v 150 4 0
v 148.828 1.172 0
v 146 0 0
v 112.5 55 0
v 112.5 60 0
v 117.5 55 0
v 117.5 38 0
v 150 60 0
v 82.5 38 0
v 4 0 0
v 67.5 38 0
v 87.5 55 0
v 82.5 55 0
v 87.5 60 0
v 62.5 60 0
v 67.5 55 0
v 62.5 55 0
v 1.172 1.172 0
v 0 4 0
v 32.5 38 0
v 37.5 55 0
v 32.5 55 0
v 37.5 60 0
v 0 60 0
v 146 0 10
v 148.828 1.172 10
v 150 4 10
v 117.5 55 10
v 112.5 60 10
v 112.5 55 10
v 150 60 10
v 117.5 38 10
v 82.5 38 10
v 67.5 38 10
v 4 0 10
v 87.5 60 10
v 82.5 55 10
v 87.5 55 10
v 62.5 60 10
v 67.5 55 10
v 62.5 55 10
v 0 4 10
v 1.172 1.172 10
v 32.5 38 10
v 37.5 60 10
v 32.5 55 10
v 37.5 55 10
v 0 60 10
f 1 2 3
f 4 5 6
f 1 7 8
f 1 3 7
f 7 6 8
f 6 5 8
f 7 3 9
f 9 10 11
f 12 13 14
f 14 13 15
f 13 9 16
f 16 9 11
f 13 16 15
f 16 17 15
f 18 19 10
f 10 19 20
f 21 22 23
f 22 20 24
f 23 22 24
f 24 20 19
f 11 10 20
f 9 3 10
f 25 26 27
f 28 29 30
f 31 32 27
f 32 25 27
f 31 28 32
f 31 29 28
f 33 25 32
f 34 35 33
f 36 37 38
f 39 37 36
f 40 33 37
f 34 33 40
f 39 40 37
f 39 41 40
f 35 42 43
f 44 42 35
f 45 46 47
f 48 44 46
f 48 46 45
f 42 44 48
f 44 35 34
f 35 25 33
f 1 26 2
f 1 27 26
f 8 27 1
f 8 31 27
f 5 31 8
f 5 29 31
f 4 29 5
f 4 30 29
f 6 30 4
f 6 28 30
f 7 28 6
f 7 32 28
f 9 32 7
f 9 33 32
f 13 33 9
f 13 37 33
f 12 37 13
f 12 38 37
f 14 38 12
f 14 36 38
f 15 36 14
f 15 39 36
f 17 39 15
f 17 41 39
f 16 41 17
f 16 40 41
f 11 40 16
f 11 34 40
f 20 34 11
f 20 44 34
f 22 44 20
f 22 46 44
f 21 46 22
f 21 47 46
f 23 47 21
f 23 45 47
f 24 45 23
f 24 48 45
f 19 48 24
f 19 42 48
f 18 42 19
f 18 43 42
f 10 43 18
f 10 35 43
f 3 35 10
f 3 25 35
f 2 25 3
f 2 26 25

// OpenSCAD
$fn = 32;

// ----------------------------------------------------------------------
// Oversize slot bar: 150 mm bar with 2 oversize windows
// ----------------------------------------------------------------------

// --- parameters (mm) ---
profile_height = 10;      // extrusion height
profile_points = 24;      // points of the closed outline

profile = [[0, 4], [1.172, 1.172], [4, 0], [146, 0], [148.828, 1.172], [150, 4], [150, 60], [112.5, 60], [112.5, 55], [117.5, 55], [117.5, 38], [82.5, 38], [82.5, 55], [87.5, 55], [87.5, 60], [62.5, 60], [62.5, 55], [67.5, 55], [67.5, 38], [32.5, 38], [32.5, 55], [37.5, 55], [37.5, 60], [0, 60]];  // single closed polygon, 24 points, counter clockwise

// --- the one profile operation ---
linear_extrude(height = profile_height) polygon(points = profile);
